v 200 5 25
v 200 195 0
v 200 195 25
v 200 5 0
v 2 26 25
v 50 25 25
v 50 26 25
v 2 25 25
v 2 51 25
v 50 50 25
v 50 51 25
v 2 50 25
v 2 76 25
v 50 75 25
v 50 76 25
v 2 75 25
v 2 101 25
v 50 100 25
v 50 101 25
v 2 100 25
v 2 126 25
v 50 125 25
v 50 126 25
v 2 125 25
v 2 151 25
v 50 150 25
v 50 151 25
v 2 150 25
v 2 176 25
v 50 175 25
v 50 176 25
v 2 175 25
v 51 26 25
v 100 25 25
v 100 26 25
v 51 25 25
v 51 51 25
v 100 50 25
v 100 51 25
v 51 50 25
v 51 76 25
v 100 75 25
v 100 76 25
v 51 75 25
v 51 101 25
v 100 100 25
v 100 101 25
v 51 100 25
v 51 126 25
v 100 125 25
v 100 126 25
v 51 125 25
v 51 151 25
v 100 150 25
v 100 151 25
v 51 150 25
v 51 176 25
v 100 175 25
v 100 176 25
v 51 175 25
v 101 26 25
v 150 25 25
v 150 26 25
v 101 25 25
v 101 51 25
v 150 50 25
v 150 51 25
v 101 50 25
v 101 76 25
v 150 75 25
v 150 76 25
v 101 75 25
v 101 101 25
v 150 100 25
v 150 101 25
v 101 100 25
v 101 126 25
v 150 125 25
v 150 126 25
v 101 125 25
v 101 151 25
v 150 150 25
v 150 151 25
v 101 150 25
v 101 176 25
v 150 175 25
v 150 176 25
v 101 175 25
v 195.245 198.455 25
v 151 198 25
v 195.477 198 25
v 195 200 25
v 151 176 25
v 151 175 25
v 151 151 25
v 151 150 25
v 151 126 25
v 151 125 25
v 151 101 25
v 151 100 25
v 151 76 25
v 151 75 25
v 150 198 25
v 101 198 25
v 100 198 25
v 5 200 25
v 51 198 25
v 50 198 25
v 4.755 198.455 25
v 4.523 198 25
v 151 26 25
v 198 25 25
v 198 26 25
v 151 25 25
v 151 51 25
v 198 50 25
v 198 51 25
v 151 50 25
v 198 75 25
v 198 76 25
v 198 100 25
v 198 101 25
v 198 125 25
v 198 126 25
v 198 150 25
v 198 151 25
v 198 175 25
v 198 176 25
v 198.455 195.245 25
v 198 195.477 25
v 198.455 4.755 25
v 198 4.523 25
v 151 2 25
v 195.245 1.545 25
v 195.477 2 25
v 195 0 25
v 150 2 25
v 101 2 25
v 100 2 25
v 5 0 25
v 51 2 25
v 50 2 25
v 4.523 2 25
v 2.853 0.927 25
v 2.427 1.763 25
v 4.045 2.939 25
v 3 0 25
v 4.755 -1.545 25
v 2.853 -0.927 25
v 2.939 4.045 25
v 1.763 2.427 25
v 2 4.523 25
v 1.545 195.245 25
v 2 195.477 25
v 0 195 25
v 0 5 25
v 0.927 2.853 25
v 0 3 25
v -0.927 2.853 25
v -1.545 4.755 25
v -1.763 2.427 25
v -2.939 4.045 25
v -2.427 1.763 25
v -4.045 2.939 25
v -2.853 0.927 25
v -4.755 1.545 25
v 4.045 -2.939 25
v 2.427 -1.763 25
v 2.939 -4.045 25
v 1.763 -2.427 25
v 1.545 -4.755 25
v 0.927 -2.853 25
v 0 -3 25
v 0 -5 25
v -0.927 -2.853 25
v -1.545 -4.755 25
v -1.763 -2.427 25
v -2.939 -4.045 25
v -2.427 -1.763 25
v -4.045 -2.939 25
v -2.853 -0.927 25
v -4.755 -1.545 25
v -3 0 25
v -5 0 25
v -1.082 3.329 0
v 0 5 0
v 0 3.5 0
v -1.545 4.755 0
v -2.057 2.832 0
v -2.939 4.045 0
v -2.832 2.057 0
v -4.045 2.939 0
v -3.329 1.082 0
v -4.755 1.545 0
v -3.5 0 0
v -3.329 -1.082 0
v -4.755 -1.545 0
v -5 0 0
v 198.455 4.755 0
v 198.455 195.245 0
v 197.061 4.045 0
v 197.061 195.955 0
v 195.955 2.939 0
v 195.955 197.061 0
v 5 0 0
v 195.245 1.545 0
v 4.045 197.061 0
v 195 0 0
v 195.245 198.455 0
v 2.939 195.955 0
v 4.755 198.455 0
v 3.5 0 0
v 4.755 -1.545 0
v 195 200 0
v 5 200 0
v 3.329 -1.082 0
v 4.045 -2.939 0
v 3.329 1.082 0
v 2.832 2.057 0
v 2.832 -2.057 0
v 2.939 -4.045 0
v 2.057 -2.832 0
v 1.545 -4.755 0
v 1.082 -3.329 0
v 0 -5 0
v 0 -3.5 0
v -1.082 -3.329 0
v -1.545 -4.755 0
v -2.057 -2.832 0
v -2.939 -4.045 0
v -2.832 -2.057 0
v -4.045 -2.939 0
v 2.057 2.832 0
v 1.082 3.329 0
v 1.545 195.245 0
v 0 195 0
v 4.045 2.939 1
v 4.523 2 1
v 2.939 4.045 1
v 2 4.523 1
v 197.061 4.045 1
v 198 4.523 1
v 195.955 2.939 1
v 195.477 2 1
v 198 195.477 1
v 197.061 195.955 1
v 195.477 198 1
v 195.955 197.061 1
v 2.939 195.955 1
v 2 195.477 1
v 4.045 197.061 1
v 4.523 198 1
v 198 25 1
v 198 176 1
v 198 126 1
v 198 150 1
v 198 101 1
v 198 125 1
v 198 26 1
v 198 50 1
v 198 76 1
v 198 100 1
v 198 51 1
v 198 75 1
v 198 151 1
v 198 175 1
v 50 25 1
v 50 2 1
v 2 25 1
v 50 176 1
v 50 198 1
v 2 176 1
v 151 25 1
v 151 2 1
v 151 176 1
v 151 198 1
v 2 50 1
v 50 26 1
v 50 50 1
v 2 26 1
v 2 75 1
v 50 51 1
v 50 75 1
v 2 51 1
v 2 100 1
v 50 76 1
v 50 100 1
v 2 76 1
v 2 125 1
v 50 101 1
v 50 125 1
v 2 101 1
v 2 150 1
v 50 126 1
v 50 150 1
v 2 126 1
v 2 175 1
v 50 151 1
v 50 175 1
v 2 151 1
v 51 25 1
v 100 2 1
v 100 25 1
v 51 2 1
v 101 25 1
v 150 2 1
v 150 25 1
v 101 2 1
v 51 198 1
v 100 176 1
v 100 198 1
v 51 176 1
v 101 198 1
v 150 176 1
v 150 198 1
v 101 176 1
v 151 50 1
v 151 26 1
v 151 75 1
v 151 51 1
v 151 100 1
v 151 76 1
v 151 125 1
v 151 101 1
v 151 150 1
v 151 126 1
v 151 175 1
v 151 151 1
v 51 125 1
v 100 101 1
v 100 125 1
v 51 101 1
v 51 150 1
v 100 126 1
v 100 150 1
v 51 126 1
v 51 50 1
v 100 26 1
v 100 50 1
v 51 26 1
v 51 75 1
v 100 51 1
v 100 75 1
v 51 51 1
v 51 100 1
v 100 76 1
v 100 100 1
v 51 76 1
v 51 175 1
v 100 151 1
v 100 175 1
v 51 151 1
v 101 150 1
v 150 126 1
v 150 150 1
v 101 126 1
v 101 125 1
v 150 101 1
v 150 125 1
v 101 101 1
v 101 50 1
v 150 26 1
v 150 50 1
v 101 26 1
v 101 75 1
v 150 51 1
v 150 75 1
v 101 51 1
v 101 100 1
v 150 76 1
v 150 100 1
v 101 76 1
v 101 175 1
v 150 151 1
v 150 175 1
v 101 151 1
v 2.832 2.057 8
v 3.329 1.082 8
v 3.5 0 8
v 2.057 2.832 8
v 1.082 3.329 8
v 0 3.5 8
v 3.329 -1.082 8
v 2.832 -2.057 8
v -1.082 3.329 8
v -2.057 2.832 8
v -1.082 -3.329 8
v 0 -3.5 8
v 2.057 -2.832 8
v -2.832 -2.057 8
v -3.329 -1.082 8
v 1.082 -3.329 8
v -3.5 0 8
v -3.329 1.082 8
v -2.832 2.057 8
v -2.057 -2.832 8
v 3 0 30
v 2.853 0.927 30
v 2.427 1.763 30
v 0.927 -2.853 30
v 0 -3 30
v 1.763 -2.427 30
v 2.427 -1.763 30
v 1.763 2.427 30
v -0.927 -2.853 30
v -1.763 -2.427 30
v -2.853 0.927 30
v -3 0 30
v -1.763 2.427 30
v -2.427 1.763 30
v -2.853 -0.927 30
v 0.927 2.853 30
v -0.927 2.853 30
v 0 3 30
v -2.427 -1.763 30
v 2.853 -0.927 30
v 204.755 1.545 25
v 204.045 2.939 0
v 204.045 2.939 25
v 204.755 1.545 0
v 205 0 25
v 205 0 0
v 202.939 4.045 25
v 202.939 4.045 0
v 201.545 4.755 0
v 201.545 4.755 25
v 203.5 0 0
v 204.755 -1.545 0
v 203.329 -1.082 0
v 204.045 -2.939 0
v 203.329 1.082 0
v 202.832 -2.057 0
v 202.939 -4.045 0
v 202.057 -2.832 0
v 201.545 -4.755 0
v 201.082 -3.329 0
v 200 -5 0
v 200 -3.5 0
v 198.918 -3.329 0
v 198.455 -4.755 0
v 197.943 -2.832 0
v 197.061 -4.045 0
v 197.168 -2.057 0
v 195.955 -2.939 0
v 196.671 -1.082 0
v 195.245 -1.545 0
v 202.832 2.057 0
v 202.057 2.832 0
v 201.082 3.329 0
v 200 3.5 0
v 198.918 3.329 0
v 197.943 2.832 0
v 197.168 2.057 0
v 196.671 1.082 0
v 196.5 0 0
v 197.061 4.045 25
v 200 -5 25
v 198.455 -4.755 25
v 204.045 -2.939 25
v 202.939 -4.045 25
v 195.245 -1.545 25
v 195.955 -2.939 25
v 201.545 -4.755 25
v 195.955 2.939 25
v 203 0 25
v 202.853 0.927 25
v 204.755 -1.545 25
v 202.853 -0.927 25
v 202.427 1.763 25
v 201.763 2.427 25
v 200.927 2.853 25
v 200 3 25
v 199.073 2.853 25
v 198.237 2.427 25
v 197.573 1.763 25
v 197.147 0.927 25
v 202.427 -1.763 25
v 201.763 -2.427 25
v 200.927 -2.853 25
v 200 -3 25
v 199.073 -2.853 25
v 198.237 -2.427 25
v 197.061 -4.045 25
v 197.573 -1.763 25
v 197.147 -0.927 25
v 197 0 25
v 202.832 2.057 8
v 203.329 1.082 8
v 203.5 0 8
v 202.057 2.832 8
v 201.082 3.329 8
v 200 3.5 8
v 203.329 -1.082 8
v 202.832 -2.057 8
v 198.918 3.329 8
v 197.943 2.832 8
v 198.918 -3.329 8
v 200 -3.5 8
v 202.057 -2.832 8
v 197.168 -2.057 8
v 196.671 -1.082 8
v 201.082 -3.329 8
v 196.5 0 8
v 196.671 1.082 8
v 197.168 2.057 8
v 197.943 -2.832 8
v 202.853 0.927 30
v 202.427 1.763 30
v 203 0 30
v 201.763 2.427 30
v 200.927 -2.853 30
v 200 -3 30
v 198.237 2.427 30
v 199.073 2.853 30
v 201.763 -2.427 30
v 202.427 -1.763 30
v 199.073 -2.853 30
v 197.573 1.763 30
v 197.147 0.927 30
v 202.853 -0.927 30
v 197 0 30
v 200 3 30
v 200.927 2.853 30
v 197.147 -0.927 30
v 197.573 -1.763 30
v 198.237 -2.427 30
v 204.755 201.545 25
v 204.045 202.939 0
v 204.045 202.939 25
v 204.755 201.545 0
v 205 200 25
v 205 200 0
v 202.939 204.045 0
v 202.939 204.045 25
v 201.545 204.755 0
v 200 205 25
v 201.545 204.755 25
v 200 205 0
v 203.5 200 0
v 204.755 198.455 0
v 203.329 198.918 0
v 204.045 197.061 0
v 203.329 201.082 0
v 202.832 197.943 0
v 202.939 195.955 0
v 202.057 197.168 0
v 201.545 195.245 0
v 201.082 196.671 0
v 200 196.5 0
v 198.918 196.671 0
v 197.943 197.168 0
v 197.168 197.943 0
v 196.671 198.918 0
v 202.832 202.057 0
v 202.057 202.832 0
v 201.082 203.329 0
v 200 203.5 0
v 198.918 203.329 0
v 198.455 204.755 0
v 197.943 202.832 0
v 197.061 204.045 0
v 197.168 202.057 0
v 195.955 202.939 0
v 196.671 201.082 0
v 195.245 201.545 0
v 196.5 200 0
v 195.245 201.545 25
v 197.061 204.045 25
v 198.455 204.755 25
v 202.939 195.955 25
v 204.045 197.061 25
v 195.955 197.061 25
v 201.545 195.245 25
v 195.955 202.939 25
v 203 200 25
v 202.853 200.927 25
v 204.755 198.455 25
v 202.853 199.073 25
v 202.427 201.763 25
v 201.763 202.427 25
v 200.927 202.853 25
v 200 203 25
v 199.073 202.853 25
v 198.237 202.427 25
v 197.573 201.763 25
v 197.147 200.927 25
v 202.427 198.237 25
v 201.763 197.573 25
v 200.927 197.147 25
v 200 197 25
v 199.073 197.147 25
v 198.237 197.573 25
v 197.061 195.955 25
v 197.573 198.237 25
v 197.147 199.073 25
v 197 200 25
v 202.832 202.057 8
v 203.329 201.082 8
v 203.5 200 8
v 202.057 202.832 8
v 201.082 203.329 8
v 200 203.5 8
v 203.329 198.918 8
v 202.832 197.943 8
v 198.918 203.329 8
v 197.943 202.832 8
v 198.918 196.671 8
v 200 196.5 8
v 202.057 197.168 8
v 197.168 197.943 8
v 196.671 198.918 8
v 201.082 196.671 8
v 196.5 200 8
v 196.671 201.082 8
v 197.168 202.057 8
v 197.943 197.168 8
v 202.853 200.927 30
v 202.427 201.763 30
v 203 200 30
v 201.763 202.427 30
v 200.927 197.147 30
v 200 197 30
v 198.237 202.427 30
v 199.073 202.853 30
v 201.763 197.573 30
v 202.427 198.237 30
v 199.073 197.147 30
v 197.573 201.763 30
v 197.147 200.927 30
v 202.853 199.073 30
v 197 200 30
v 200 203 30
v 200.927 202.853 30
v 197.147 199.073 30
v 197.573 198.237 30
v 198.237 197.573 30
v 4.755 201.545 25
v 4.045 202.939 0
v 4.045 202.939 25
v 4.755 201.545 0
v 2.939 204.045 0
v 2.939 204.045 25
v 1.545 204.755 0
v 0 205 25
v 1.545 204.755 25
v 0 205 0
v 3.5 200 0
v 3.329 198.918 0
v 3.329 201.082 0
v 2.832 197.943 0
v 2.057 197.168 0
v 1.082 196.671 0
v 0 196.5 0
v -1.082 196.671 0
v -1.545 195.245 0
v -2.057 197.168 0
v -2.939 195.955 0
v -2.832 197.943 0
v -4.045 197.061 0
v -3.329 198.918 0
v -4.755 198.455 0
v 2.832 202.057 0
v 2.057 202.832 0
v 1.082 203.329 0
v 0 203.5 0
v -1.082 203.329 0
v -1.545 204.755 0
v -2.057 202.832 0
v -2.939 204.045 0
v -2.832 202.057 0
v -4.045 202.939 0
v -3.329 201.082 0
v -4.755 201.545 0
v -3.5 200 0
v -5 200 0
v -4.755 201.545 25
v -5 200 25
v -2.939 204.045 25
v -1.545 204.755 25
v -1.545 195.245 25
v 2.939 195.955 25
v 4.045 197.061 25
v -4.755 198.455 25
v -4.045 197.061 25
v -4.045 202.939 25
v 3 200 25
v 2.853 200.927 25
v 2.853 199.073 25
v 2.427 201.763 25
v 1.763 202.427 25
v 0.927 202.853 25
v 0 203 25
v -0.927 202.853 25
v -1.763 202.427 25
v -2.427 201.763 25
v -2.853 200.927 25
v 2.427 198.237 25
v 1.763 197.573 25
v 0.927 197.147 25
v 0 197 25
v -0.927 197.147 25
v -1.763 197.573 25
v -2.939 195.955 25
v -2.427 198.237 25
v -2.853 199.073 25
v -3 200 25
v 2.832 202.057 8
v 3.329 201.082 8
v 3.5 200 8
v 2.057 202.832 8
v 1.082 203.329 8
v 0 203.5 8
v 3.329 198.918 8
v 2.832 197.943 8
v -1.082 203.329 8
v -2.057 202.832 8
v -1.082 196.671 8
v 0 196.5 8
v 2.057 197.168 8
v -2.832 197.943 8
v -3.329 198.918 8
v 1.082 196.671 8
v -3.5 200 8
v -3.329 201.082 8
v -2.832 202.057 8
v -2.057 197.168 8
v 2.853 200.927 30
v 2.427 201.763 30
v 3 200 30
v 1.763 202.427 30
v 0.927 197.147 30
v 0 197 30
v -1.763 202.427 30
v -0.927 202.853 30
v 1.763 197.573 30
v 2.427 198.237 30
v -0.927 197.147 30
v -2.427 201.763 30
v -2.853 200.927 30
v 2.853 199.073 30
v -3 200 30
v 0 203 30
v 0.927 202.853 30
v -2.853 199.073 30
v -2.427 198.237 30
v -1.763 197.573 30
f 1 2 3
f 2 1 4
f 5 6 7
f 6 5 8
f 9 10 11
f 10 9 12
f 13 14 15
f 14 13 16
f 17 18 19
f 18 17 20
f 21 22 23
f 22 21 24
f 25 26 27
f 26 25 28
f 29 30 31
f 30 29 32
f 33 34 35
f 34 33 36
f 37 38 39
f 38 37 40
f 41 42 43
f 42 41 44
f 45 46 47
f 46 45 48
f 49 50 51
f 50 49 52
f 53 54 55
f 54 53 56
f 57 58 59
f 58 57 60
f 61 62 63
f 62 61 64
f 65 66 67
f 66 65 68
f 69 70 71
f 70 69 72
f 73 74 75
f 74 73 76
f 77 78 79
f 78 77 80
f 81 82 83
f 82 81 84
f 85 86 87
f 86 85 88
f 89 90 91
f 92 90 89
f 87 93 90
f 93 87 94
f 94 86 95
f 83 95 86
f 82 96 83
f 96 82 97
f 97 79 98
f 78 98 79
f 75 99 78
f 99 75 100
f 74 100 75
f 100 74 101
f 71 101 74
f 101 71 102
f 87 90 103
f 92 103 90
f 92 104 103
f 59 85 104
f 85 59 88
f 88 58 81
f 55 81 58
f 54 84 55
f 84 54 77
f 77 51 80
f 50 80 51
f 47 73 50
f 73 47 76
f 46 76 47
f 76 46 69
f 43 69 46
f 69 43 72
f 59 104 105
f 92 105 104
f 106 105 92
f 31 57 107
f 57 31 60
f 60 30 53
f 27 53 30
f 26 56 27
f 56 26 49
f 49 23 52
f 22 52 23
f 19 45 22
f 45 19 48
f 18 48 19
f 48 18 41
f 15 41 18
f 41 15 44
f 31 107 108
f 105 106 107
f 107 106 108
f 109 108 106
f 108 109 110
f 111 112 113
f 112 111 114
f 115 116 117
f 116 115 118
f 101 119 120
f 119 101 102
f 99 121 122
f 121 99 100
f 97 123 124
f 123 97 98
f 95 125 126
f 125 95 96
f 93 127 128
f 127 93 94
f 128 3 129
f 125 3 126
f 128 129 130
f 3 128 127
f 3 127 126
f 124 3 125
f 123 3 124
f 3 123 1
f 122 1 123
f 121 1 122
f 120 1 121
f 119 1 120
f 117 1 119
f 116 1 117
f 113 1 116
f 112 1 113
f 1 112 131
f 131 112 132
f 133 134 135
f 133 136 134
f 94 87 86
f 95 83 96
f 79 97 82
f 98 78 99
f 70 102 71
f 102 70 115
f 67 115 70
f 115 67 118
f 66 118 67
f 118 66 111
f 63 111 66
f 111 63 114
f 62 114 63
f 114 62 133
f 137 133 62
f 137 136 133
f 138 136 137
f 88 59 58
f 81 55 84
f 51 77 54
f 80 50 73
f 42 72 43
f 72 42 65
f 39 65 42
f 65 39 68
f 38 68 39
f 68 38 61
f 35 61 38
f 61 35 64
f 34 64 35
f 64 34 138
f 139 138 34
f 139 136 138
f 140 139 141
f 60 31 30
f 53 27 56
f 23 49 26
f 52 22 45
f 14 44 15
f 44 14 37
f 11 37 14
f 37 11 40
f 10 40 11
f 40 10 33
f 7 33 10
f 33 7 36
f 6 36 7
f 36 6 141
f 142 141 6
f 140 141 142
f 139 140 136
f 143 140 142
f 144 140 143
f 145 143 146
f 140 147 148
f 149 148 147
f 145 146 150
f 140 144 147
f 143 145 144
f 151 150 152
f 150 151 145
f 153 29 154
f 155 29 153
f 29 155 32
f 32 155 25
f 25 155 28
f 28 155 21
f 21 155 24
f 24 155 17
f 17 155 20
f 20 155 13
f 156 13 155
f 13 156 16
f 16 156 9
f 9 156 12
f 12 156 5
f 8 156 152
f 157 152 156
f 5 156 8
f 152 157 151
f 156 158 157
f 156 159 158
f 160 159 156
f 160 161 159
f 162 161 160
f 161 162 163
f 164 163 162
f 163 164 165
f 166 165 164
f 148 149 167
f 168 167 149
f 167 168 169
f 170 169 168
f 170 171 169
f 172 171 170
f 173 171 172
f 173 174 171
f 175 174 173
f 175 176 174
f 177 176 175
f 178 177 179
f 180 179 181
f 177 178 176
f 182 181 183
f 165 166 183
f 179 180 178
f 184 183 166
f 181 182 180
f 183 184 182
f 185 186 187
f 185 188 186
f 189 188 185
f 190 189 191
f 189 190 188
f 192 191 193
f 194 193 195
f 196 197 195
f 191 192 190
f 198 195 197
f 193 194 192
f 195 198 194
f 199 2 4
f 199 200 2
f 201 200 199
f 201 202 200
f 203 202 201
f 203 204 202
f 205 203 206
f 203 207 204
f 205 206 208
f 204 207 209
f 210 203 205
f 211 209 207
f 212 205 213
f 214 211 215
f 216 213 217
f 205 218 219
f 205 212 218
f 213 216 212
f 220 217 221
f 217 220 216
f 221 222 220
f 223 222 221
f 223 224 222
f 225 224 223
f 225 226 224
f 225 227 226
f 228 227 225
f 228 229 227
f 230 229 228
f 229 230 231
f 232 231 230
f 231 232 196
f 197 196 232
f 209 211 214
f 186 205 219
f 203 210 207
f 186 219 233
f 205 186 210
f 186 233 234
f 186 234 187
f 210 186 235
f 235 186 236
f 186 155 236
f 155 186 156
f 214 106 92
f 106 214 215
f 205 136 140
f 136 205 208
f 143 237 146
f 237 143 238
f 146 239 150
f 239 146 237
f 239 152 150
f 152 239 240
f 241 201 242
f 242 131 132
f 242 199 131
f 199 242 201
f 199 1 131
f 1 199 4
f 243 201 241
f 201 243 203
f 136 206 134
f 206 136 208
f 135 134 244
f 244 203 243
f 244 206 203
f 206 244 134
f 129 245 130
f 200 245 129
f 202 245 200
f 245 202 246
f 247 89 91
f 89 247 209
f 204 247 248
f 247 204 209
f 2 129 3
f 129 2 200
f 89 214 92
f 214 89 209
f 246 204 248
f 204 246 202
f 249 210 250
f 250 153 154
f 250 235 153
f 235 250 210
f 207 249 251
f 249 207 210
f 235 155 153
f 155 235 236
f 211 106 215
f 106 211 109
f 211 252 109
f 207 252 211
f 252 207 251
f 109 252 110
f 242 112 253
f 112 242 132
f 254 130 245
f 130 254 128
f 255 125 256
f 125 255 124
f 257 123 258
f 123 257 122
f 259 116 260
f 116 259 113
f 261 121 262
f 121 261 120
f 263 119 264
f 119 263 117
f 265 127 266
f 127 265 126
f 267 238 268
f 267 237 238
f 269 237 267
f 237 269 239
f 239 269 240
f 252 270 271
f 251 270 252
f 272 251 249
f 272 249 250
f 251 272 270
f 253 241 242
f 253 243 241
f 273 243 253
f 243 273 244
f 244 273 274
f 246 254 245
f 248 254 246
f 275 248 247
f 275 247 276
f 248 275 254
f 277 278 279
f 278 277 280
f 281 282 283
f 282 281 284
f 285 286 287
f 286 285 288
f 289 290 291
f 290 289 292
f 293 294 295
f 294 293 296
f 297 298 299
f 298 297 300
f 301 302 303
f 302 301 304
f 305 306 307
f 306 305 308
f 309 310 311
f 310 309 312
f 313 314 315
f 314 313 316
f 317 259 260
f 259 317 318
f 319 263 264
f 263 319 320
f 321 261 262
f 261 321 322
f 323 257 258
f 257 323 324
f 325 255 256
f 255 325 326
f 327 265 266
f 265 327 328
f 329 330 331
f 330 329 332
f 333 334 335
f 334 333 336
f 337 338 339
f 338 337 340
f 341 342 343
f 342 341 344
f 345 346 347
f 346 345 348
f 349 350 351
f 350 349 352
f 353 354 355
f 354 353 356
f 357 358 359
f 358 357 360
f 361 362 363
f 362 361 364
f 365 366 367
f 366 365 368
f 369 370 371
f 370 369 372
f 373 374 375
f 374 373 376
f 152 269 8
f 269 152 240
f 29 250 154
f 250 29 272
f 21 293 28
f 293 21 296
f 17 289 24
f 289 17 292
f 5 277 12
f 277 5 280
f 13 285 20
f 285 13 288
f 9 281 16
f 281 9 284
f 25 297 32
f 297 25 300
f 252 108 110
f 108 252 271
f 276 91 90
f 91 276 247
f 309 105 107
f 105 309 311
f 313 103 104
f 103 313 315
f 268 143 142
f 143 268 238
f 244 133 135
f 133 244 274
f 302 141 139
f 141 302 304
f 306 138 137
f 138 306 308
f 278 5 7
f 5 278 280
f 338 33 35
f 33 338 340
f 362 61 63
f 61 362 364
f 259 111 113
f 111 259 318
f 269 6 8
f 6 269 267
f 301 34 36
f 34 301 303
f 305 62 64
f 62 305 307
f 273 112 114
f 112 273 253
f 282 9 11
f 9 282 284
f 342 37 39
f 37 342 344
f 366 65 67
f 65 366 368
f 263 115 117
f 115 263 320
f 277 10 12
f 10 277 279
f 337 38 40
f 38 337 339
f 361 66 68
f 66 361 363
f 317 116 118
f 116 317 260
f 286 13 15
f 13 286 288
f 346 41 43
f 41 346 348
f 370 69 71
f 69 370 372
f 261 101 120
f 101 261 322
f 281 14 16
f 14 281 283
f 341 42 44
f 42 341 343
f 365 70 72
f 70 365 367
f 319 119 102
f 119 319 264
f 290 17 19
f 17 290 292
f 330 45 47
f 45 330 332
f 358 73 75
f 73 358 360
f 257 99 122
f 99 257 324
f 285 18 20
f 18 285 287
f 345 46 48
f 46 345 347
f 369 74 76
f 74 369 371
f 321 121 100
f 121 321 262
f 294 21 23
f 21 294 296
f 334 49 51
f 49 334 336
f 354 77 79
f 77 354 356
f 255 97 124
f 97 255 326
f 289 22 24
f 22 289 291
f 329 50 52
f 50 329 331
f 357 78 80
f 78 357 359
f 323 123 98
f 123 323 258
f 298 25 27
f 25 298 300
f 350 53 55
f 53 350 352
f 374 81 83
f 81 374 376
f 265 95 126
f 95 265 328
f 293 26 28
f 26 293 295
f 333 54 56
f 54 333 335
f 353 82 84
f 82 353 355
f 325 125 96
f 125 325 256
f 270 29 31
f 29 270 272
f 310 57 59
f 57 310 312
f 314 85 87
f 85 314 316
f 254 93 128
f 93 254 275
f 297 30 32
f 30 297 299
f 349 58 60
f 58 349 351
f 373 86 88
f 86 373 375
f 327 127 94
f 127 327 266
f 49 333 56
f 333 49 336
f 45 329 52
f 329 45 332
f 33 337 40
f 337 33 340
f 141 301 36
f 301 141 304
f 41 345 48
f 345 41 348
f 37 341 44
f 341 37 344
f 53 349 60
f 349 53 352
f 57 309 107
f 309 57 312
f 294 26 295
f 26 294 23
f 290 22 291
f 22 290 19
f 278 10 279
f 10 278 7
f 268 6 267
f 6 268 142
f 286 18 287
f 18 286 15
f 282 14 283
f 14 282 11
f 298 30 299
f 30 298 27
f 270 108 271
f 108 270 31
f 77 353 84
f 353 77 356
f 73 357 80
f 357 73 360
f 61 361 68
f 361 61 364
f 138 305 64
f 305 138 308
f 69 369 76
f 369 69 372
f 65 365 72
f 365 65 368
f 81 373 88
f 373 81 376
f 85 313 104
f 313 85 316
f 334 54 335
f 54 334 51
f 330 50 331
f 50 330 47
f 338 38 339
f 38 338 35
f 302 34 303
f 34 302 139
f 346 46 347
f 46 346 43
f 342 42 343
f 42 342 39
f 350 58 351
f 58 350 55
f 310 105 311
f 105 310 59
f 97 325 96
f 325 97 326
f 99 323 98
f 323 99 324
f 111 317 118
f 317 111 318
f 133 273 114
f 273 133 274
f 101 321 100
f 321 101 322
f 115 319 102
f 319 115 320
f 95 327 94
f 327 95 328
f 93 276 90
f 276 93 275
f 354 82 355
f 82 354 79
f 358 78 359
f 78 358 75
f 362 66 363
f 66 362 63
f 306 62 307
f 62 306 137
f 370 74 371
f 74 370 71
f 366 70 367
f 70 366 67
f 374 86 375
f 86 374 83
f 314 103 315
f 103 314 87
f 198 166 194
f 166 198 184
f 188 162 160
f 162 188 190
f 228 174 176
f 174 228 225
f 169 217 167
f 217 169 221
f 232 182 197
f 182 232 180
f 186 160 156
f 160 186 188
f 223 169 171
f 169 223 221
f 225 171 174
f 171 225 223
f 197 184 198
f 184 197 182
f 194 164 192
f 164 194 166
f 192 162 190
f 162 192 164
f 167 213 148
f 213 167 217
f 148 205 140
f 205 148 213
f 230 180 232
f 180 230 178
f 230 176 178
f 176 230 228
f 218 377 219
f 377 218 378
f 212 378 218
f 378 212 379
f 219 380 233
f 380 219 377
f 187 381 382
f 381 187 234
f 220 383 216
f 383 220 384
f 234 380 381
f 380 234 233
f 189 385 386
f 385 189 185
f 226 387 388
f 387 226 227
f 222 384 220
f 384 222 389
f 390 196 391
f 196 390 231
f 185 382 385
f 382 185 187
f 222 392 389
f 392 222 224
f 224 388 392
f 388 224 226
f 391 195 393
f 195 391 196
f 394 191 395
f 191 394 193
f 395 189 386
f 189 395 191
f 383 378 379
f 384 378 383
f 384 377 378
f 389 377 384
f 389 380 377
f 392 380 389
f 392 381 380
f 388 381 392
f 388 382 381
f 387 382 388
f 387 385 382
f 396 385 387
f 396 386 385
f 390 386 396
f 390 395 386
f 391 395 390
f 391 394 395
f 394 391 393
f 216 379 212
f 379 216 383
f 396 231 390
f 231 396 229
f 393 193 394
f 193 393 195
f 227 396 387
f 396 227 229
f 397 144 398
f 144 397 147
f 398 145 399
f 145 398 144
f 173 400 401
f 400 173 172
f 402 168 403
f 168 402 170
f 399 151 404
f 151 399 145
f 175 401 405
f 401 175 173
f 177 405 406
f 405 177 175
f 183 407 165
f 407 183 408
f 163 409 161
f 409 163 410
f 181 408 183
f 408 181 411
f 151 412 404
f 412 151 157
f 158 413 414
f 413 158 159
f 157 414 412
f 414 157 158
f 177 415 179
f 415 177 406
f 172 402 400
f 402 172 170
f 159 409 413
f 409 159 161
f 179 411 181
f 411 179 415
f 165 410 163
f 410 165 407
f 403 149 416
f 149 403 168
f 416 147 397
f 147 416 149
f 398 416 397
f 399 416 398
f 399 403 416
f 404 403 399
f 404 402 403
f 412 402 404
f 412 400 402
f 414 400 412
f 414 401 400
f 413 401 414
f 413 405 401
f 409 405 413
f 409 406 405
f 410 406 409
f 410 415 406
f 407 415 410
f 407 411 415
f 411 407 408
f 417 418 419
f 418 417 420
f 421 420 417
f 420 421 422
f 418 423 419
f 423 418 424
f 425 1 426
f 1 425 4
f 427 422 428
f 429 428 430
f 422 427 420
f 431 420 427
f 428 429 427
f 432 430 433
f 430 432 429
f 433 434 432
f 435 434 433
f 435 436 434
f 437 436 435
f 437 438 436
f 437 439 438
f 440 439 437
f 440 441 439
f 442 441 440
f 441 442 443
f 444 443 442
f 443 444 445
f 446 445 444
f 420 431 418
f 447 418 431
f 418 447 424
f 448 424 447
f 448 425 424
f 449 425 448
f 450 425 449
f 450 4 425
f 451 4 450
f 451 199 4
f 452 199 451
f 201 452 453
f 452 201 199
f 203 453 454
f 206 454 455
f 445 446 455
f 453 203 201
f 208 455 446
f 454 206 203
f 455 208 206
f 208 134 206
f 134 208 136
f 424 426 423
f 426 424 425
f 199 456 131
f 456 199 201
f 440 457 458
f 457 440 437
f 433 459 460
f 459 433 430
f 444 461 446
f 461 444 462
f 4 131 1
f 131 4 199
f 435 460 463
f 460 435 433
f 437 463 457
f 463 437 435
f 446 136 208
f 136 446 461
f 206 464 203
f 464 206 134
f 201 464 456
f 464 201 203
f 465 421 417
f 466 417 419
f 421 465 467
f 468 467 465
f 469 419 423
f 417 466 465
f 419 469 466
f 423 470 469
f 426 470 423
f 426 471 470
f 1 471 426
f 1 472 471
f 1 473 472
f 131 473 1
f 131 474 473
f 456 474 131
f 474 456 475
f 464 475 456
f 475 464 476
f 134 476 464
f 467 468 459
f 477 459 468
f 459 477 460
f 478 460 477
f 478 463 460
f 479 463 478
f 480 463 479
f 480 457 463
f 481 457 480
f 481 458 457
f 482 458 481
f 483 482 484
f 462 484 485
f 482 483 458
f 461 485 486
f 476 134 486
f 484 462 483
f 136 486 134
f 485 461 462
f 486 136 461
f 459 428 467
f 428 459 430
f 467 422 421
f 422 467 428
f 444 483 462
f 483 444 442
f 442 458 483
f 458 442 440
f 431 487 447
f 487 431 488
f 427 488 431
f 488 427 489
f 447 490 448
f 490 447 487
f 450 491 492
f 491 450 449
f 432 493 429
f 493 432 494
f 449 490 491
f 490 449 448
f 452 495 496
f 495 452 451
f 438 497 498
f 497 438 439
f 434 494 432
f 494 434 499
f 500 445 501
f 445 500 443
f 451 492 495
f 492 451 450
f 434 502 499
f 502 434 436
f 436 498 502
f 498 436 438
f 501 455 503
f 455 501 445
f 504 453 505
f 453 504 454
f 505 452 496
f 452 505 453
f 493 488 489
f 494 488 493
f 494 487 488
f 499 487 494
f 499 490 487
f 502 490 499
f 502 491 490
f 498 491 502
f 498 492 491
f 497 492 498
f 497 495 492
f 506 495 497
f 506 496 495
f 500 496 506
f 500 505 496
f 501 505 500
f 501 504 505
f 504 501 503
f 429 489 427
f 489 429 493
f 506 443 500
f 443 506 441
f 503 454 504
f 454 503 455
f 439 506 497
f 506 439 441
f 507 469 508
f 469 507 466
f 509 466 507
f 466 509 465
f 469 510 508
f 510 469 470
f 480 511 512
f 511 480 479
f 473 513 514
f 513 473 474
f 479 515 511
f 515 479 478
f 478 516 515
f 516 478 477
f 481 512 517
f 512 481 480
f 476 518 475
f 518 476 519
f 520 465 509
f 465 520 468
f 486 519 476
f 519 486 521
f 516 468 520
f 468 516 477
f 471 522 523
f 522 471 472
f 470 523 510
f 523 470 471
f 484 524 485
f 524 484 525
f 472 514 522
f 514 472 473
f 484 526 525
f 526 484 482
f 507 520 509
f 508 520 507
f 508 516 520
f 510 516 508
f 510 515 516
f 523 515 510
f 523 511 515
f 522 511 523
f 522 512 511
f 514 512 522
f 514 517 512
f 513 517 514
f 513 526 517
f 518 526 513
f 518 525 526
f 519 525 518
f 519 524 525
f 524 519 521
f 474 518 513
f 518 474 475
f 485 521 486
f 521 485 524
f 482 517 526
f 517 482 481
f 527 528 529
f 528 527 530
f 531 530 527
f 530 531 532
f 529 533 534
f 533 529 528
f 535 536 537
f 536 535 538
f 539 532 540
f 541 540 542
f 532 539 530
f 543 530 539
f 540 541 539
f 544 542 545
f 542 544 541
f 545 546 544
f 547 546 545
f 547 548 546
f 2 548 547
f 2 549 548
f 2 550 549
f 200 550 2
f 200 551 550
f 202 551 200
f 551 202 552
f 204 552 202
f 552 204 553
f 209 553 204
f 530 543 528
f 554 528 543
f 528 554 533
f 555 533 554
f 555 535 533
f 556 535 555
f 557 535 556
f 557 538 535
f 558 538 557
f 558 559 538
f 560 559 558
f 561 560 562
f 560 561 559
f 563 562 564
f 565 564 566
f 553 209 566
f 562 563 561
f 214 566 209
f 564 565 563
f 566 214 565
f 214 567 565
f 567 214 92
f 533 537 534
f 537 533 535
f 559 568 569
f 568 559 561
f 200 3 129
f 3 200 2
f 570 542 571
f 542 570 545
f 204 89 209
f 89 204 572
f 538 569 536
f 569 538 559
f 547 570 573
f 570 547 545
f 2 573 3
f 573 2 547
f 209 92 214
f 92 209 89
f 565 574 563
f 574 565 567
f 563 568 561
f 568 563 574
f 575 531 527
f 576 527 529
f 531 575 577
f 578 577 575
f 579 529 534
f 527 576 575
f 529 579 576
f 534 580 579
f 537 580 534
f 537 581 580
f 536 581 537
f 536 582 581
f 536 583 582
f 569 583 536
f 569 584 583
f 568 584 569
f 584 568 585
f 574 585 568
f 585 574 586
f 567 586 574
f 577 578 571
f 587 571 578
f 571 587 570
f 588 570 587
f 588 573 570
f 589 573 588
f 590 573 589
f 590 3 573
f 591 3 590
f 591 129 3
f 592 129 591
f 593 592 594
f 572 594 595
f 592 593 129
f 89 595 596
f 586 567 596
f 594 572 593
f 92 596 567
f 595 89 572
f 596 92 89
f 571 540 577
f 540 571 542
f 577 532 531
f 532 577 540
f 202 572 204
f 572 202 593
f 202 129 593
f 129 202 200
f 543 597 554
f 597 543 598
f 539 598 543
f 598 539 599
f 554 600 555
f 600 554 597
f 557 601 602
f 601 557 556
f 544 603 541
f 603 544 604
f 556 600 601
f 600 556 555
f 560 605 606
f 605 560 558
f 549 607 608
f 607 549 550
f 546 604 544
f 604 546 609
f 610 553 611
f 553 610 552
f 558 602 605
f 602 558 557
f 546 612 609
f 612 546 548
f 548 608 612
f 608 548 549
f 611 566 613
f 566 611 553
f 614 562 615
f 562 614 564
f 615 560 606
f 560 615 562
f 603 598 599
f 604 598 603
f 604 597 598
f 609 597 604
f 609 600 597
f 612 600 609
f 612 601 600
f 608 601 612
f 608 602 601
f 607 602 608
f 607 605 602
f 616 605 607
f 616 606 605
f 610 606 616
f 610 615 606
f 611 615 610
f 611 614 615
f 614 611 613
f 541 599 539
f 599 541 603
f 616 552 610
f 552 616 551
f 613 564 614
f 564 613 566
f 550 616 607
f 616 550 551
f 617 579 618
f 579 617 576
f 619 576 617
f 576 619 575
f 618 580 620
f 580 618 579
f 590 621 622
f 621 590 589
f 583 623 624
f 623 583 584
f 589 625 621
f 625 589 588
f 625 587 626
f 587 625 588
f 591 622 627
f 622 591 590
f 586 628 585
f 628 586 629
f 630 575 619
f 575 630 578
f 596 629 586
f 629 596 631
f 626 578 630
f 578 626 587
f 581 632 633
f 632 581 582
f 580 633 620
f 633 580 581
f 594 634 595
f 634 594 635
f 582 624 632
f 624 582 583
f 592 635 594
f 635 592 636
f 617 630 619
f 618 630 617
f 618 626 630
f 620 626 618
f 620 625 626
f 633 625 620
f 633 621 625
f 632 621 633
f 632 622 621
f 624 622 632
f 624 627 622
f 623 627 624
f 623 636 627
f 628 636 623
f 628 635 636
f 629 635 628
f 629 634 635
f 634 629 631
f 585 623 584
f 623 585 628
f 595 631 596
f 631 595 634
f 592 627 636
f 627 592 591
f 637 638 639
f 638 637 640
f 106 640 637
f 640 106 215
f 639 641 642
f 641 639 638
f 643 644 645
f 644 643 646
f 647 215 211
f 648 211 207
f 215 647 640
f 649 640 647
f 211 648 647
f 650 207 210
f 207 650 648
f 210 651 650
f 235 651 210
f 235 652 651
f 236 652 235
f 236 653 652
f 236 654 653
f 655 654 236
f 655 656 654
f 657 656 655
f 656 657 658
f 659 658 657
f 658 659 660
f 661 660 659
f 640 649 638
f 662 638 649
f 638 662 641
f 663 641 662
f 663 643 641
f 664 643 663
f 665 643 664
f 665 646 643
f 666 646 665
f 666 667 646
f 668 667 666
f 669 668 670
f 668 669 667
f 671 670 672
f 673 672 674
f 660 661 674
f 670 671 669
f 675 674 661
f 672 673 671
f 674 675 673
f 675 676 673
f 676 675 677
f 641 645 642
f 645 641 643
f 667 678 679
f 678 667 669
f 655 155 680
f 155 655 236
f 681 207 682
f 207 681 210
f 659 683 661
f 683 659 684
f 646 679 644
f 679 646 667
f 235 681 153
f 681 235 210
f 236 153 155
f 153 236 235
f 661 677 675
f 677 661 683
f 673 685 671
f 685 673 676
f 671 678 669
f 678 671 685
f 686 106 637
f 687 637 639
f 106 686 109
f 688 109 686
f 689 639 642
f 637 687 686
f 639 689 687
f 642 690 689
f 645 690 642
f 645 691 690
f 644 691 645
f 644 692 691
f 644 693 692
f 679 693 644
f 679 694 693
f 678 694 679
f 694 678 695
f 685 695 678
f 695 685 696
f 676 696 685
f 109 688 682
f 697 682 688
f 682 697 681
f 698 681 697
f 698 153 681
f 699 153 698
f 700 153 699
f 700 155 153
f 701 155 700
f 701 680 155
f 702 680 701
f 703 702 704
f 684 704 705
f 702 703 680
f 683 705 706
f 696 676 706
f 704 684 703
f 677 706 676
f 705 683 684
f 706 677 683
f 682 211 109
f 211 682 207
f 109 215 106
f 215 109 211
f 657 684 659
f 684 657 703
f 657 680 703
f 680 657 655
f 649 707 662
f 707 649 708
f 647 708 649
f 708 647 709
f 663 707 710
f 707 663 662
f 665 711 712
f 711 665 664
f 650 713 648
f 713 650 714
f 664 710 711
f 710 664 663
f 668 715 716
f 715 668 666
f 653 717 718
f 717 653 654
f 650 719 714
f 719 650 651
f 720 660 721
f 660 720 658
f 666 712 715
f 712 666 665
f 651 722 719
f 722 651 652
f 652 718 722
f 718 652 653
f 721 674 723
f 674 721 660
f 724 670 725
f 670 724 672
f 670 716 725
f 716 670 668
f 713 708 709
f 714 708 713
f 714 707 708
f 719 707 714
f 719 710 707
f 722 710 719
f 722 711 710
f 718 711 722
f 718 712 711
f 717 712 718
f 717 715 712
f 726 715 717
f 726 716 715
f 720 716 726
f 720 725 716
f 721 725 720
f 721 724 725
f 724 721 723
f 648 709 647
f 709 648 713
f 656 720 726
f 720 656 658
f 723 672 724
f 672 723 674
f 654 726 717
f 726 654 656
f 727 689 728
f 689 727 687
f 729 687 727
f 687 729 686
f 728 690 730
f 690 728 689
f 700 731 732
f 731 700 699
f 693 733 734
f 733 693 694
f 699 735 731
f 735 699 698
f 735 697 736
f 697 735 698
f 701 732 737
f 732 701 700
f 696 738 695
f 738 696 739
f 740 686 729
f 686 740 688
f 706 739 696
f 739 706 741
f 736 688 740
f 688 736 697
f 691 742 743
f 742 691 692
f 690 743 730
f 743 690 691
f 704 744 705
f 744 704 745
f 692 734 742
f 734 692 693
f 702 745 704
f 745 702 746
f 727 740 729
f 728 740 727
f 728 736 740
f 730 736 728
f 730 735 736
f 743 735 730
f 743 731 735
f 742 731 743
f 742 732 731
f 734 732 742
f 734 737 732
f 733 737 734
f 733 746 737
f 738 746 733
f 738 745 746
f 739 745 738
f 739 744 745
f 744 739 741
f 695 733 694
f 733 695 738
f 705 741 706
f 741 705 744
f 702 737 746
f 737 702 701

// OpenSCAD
$fn = 20;

frame_width = 200;
frame_length = 200;
frame_height = 25;

rows = 8;
cols = 4;

divider_thickness = 1;
edge_thickness = 2;
bottom_thickness = 1;

joint_radius = 5;
inner_joint_radius = 3;
inner_joint_height = 5;
inner_joint_radius_spacing = 0.5;
inner_joint_height_spacing = 3;

echo("Compartment size (mm): ", frame_width / cols, " x ", frame_length / rows);

module draw_frame() {
    difference() {
        cube([frame_width, frame_length, frame_height]);
        
        // Cutouts for joints
        cylinder(frame_height, r = joint_radius);
        translate([frame_width, 0, 0]) {
            cylinder(frame_height, r = joint_radius);
        }
        translate([frame_width, frame_length, 0]) {
            cylinder(frame_height, r = joint_radius);
        }
        translate([0, frame_length, 0]) {
            cylinder(frame_height, r = joint_radius);
        }
        
        translate([edge_thickness, edge_thickness, bottom_thickness]) {
            cube([frame_width - 2 * edge_thickness, frame_length - 2 * edge_thickness, frame_height - bottom_thickness]);
        }
    }
}

module draw_cells() {
    for (row_offset = [frame_length / rows:frame_length / rows:frame_length - 1]) {
        translate([0, row_offset, 0]) {
            cube([frame_width, divider_thickness, frame_height]);
        }
    }
    
    for (col_offset = [frame_width / cols:frame_width / cols:frame_width - 1]) {
        translate([col_offset, 0, 0]) {
            cube([divider_thickness, frame_length, frame_height]);
        }
    }
}

module draw_joint() {
    difference() {
        cylinder(frame_height, r = joint_radius);
        
        cylinder(inner_joint_height + inner_joint_height_spacing, r = inner_joint_radius + inner_joint_radius_spacing);
    }
    
    translate([0, 0, frame_height]) {
        cylinder(inner_joint_height, r = inner_joint_radius);
    }
}

module draw_joints() {
    draw_joint();
    translate([frame_width, 0, 0]) {
        draw_joint();
    }
    translate([frame_width, frame_length, 0]) {
        draw_joint();
    }
    translate([0, frame_length, 0]) {
        draw_joint();
    }
}


draw_frame();
draw_cells();
    
draw_joints();
